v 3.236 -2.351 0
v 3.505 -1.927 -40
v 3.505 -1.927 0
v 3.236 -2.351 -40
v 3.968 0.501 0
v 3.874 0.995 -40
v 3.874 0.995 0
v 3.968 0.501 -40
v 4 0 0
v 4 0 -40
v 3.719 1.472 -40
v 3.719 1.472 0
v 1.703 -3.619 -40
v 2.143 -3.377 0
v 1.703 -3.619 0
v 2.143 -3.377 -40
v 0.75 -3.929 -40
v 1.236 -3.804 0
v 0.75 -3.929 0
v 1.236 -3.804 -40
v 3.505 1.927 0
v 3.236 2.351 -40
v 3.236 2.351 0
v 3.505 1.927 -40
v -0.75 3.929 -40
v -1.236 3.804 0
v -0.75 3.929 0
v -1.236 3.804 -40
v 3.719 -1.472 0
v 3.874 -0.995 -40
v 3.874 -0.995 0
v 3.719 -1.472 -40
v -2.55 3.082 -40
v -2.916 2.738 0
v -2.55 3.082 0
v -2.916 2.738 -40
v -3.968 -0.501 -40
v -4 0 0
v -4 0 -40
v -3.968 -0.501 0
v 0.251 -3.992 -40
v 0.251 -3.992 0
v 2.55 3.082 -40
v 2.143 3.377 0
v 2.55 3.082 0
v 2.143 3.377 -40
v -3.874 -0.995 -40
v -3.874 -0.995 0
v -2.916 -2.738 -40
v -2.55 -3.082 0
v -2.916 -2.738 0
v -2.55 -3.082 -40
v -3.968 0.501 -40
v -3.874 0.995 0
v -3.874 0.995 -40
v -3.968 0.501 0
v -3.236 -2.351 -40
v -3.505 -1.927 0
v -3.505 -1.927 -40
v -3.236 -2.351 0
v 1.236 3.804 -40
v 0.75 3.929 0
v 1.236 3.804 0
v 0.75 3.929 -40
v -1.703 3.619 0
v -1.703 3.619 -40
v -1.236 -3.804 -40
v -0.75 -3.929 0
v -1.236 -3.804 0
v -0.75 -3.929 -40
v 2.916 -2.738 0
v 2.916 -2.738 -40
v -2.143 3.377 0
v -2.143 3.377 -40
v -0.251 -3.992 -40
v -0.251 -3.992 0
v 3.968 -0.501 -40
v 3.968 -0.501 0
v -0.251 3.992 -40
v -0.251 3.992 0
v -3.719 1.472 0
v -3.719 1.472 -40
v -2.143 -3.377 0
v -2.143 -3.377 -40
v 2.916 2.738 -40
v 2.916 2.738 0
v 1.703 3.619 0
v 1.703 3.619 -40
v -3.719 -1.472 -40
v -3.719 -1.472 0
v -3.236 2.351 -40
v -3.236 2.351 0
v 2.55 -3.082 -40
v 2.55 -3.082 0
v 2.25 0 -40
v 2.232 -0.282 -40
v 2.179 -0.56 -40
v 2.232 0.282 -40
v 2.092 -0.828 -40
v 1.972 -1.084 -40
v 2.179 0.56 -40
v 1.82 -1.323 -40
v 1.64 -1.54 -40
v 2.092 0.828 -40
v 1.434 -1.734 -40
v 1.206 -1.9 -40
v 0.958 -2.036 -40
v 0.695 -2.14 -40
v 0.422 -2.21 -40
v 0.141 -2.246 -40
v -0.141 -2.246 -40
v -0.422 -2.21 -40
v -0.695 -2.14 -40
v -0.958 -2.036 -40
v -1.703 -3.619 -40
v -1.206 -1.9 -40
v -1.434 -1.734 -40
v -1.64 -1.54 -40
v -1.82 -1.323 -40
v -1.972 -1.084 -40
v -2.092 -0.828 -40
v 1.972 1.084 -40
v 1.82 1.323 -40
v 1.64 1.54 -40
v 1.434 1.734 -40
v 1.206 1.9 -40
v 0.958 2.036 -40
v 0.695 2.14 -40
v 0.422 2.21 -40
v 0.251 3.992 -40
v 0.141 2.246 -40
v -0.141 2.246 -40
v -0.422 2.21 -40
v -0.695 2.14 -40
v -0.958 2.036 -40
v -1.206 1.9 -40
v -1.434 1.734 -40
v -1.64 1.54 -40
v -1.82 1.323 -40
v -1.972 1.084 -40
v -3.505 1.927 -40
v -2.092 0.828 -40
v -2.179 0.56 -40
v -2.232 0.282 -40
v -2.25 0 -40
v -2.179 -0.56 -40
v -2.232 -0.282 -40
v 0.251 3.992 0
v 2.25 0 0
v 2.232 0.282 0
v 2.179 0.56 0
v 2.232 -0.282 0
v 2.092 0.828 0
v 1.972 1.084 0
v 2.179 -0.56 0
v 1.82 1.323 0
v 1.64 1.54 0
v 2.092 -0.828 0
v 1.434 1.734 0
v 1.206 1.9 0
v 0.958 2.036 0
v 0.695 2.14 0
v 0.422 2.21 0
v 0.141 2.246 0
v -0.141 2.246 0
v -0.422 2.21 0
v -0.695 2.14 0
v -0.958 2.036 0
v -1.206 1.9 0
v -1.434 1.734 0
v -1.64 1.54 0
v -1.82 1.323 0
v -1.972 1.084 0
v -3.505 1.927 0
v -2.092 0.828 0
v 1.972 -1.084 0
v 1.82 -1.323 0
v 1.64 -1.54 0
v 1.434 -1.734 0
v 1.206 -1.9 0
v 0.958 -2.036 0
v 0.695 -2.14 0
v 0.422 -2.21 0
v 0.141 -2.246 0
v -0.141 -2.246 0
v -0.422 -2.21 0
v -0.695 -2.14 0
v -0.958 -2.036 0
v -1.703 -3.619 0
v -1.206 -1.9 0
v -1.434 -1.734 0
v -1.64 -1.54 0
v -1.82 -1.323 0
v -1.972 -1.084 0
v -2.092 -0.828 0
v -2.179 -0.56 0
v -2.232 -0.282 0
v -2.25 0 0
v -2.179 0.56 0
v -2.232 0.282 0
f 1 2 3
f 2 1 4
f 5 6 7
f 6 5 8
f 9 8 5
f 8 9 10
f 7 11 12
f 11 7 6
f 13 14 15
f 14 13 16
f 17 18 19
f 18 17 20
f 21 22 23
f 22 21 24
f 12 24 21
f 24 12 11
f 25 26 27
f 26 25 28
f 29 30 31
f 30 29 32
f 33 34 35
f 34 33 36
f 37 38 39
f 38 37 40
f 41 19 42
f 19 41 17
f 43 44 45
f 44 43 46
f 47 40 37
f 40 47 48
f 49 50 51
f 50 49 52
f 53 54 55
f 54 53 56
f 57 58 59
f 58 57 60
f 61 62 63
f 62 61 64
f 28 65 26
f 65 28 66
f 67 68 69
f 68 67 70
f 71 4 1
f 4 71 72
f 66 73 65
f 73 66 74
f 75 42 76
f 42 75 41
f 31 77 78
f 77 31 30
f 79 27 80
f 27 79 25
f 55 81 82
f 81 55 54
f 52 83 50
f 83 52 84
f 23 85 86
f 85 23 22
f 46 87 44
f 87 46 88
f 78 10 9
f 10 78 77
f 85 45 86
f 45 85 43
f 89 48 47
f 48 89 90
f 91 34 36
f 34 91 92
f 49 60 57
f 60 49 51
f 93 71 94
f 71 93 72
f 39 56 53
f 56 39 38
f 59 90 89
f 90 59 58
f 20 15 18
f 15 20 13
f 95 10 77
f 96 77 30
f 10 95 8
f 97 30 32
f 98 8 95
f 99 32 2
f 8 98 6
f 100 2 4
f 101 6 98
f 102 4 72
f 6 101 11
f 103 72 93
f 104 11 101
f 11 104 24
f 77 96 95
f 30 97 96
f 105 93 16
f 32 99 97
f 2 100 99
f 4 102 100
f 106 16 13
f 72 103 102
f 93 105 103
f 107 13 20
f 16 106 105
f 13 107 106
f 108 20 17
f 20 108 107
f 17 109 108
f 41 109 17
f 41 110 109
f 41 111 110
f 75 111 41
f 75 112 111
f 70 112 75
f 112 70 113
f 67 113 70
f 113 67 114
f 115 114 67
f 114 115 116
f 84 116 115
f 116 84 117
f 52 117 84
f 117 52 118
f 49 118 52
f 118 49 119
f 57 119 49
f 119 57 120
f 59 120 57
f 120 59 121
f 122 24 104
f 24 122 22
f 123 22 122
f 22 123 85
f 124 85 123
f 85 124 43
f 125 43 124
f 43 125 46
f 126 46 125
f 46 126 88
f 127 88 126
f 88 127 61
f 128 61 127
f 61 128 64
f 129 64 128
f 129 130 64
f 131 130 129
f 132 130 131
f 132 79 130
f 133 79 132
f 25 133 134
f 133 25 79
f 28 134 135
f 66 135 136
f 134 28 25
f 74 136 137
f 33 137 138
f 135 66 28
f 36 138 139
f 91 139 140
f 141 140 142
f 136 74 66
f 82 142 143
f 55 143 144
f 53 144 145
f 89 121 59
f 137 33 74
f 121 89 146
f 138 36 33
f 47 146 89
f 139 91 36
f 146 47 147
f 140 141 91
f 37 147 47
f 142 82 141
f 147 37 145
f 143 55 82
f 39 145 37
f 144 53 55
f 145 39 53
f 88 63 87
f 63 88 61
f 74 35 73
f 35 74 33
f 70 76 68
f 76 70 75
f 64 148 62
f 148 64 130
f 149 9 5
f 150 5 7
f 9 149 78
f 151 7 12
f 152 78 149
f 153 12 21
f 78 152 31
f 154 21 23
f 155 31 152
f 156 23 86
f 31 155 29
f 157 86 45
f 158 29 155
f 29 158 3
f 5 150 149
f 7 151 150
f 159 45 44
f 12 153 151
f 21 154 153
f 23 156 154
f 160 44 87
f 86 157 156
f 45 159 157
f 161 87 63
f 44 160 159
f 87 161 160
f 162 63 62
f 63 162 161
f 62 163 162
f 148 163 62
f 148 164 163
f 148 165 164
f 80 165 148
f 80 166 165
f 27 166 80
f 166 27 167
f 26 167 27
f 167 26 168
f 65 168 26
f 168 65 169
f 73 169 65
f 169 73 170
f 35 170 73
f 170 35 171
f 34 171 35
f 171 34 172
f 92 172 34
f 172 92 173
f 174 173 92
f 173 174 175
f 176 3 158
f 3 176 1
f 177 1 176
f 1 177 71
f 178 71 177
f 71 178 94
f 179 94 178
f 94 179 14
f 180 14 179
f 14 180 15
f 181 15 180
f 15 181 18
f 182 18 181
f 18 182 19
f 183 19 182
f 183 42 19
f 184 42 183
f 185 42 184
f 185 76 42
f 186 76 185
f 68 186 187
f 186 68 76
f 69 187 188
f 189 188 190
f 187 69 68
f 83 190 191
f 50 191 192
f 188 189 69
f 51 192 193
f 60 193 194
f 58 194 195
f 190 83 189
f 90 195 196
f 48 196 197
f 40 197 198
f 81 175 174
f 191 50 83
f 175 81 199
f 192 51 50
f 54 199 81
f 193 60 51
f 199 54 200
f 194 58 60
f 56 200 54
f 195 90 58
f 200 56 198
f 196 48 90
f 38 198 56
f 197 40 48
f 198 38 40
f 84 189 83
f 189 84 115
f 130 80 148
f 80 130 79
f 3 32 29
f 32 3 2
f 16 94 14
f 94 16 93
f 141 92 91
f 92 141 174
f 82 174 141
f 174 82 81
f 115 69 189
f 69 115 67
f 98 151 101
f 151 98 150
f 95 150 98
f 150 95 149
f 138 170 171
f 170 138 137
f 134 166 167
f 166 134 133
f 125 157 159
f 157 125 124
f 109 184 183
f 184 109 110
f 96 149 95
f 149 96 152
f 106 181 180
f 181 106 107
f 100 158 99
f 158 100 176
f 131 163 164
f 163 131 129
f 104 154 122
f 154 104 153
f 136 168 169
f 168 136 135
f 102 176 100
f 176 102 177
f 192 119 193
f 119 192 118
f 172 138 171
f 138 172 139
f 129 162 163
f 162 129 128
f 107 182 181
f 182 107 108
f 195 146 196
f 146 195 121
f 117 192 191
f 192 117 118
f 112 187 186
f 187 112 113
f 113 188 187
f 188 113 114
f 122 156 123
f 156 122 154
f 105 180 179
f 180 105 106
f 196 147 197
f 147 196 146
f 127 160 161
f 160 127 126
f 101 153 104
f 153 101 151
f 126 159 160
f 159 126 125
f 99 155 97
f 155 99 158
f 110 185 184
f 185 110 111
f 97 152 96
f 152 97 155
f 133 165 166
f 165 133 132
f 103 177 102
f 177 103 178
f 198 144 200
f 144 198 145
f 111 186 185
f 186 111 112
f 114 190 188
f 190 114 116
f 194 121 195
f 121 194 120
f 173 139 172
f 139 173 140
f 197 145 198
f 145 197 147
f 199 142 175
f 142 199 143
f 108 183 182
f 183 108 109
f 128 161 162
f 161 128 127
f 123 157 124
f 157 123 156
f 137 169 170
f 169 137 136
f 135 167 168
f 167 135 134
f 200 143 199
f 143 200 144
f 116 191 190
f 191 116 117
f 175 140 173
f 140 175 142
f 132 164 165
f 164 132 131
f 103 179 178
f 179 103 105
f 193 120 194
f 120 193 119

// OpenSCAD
$fn = 50;


difference() {
	union() {
		translate(v = [0, 0, -40.0000000000]) {
			cylinder(h = 40, r = 4.0000000000);
		}
		cylinder(h = 0, r = 7.0000000000);
	}
	union() {
		#translate(v = [0, 0, -40]) {
			cylinder(h = 40, r = 2.2500000000);
		}
	}
}
